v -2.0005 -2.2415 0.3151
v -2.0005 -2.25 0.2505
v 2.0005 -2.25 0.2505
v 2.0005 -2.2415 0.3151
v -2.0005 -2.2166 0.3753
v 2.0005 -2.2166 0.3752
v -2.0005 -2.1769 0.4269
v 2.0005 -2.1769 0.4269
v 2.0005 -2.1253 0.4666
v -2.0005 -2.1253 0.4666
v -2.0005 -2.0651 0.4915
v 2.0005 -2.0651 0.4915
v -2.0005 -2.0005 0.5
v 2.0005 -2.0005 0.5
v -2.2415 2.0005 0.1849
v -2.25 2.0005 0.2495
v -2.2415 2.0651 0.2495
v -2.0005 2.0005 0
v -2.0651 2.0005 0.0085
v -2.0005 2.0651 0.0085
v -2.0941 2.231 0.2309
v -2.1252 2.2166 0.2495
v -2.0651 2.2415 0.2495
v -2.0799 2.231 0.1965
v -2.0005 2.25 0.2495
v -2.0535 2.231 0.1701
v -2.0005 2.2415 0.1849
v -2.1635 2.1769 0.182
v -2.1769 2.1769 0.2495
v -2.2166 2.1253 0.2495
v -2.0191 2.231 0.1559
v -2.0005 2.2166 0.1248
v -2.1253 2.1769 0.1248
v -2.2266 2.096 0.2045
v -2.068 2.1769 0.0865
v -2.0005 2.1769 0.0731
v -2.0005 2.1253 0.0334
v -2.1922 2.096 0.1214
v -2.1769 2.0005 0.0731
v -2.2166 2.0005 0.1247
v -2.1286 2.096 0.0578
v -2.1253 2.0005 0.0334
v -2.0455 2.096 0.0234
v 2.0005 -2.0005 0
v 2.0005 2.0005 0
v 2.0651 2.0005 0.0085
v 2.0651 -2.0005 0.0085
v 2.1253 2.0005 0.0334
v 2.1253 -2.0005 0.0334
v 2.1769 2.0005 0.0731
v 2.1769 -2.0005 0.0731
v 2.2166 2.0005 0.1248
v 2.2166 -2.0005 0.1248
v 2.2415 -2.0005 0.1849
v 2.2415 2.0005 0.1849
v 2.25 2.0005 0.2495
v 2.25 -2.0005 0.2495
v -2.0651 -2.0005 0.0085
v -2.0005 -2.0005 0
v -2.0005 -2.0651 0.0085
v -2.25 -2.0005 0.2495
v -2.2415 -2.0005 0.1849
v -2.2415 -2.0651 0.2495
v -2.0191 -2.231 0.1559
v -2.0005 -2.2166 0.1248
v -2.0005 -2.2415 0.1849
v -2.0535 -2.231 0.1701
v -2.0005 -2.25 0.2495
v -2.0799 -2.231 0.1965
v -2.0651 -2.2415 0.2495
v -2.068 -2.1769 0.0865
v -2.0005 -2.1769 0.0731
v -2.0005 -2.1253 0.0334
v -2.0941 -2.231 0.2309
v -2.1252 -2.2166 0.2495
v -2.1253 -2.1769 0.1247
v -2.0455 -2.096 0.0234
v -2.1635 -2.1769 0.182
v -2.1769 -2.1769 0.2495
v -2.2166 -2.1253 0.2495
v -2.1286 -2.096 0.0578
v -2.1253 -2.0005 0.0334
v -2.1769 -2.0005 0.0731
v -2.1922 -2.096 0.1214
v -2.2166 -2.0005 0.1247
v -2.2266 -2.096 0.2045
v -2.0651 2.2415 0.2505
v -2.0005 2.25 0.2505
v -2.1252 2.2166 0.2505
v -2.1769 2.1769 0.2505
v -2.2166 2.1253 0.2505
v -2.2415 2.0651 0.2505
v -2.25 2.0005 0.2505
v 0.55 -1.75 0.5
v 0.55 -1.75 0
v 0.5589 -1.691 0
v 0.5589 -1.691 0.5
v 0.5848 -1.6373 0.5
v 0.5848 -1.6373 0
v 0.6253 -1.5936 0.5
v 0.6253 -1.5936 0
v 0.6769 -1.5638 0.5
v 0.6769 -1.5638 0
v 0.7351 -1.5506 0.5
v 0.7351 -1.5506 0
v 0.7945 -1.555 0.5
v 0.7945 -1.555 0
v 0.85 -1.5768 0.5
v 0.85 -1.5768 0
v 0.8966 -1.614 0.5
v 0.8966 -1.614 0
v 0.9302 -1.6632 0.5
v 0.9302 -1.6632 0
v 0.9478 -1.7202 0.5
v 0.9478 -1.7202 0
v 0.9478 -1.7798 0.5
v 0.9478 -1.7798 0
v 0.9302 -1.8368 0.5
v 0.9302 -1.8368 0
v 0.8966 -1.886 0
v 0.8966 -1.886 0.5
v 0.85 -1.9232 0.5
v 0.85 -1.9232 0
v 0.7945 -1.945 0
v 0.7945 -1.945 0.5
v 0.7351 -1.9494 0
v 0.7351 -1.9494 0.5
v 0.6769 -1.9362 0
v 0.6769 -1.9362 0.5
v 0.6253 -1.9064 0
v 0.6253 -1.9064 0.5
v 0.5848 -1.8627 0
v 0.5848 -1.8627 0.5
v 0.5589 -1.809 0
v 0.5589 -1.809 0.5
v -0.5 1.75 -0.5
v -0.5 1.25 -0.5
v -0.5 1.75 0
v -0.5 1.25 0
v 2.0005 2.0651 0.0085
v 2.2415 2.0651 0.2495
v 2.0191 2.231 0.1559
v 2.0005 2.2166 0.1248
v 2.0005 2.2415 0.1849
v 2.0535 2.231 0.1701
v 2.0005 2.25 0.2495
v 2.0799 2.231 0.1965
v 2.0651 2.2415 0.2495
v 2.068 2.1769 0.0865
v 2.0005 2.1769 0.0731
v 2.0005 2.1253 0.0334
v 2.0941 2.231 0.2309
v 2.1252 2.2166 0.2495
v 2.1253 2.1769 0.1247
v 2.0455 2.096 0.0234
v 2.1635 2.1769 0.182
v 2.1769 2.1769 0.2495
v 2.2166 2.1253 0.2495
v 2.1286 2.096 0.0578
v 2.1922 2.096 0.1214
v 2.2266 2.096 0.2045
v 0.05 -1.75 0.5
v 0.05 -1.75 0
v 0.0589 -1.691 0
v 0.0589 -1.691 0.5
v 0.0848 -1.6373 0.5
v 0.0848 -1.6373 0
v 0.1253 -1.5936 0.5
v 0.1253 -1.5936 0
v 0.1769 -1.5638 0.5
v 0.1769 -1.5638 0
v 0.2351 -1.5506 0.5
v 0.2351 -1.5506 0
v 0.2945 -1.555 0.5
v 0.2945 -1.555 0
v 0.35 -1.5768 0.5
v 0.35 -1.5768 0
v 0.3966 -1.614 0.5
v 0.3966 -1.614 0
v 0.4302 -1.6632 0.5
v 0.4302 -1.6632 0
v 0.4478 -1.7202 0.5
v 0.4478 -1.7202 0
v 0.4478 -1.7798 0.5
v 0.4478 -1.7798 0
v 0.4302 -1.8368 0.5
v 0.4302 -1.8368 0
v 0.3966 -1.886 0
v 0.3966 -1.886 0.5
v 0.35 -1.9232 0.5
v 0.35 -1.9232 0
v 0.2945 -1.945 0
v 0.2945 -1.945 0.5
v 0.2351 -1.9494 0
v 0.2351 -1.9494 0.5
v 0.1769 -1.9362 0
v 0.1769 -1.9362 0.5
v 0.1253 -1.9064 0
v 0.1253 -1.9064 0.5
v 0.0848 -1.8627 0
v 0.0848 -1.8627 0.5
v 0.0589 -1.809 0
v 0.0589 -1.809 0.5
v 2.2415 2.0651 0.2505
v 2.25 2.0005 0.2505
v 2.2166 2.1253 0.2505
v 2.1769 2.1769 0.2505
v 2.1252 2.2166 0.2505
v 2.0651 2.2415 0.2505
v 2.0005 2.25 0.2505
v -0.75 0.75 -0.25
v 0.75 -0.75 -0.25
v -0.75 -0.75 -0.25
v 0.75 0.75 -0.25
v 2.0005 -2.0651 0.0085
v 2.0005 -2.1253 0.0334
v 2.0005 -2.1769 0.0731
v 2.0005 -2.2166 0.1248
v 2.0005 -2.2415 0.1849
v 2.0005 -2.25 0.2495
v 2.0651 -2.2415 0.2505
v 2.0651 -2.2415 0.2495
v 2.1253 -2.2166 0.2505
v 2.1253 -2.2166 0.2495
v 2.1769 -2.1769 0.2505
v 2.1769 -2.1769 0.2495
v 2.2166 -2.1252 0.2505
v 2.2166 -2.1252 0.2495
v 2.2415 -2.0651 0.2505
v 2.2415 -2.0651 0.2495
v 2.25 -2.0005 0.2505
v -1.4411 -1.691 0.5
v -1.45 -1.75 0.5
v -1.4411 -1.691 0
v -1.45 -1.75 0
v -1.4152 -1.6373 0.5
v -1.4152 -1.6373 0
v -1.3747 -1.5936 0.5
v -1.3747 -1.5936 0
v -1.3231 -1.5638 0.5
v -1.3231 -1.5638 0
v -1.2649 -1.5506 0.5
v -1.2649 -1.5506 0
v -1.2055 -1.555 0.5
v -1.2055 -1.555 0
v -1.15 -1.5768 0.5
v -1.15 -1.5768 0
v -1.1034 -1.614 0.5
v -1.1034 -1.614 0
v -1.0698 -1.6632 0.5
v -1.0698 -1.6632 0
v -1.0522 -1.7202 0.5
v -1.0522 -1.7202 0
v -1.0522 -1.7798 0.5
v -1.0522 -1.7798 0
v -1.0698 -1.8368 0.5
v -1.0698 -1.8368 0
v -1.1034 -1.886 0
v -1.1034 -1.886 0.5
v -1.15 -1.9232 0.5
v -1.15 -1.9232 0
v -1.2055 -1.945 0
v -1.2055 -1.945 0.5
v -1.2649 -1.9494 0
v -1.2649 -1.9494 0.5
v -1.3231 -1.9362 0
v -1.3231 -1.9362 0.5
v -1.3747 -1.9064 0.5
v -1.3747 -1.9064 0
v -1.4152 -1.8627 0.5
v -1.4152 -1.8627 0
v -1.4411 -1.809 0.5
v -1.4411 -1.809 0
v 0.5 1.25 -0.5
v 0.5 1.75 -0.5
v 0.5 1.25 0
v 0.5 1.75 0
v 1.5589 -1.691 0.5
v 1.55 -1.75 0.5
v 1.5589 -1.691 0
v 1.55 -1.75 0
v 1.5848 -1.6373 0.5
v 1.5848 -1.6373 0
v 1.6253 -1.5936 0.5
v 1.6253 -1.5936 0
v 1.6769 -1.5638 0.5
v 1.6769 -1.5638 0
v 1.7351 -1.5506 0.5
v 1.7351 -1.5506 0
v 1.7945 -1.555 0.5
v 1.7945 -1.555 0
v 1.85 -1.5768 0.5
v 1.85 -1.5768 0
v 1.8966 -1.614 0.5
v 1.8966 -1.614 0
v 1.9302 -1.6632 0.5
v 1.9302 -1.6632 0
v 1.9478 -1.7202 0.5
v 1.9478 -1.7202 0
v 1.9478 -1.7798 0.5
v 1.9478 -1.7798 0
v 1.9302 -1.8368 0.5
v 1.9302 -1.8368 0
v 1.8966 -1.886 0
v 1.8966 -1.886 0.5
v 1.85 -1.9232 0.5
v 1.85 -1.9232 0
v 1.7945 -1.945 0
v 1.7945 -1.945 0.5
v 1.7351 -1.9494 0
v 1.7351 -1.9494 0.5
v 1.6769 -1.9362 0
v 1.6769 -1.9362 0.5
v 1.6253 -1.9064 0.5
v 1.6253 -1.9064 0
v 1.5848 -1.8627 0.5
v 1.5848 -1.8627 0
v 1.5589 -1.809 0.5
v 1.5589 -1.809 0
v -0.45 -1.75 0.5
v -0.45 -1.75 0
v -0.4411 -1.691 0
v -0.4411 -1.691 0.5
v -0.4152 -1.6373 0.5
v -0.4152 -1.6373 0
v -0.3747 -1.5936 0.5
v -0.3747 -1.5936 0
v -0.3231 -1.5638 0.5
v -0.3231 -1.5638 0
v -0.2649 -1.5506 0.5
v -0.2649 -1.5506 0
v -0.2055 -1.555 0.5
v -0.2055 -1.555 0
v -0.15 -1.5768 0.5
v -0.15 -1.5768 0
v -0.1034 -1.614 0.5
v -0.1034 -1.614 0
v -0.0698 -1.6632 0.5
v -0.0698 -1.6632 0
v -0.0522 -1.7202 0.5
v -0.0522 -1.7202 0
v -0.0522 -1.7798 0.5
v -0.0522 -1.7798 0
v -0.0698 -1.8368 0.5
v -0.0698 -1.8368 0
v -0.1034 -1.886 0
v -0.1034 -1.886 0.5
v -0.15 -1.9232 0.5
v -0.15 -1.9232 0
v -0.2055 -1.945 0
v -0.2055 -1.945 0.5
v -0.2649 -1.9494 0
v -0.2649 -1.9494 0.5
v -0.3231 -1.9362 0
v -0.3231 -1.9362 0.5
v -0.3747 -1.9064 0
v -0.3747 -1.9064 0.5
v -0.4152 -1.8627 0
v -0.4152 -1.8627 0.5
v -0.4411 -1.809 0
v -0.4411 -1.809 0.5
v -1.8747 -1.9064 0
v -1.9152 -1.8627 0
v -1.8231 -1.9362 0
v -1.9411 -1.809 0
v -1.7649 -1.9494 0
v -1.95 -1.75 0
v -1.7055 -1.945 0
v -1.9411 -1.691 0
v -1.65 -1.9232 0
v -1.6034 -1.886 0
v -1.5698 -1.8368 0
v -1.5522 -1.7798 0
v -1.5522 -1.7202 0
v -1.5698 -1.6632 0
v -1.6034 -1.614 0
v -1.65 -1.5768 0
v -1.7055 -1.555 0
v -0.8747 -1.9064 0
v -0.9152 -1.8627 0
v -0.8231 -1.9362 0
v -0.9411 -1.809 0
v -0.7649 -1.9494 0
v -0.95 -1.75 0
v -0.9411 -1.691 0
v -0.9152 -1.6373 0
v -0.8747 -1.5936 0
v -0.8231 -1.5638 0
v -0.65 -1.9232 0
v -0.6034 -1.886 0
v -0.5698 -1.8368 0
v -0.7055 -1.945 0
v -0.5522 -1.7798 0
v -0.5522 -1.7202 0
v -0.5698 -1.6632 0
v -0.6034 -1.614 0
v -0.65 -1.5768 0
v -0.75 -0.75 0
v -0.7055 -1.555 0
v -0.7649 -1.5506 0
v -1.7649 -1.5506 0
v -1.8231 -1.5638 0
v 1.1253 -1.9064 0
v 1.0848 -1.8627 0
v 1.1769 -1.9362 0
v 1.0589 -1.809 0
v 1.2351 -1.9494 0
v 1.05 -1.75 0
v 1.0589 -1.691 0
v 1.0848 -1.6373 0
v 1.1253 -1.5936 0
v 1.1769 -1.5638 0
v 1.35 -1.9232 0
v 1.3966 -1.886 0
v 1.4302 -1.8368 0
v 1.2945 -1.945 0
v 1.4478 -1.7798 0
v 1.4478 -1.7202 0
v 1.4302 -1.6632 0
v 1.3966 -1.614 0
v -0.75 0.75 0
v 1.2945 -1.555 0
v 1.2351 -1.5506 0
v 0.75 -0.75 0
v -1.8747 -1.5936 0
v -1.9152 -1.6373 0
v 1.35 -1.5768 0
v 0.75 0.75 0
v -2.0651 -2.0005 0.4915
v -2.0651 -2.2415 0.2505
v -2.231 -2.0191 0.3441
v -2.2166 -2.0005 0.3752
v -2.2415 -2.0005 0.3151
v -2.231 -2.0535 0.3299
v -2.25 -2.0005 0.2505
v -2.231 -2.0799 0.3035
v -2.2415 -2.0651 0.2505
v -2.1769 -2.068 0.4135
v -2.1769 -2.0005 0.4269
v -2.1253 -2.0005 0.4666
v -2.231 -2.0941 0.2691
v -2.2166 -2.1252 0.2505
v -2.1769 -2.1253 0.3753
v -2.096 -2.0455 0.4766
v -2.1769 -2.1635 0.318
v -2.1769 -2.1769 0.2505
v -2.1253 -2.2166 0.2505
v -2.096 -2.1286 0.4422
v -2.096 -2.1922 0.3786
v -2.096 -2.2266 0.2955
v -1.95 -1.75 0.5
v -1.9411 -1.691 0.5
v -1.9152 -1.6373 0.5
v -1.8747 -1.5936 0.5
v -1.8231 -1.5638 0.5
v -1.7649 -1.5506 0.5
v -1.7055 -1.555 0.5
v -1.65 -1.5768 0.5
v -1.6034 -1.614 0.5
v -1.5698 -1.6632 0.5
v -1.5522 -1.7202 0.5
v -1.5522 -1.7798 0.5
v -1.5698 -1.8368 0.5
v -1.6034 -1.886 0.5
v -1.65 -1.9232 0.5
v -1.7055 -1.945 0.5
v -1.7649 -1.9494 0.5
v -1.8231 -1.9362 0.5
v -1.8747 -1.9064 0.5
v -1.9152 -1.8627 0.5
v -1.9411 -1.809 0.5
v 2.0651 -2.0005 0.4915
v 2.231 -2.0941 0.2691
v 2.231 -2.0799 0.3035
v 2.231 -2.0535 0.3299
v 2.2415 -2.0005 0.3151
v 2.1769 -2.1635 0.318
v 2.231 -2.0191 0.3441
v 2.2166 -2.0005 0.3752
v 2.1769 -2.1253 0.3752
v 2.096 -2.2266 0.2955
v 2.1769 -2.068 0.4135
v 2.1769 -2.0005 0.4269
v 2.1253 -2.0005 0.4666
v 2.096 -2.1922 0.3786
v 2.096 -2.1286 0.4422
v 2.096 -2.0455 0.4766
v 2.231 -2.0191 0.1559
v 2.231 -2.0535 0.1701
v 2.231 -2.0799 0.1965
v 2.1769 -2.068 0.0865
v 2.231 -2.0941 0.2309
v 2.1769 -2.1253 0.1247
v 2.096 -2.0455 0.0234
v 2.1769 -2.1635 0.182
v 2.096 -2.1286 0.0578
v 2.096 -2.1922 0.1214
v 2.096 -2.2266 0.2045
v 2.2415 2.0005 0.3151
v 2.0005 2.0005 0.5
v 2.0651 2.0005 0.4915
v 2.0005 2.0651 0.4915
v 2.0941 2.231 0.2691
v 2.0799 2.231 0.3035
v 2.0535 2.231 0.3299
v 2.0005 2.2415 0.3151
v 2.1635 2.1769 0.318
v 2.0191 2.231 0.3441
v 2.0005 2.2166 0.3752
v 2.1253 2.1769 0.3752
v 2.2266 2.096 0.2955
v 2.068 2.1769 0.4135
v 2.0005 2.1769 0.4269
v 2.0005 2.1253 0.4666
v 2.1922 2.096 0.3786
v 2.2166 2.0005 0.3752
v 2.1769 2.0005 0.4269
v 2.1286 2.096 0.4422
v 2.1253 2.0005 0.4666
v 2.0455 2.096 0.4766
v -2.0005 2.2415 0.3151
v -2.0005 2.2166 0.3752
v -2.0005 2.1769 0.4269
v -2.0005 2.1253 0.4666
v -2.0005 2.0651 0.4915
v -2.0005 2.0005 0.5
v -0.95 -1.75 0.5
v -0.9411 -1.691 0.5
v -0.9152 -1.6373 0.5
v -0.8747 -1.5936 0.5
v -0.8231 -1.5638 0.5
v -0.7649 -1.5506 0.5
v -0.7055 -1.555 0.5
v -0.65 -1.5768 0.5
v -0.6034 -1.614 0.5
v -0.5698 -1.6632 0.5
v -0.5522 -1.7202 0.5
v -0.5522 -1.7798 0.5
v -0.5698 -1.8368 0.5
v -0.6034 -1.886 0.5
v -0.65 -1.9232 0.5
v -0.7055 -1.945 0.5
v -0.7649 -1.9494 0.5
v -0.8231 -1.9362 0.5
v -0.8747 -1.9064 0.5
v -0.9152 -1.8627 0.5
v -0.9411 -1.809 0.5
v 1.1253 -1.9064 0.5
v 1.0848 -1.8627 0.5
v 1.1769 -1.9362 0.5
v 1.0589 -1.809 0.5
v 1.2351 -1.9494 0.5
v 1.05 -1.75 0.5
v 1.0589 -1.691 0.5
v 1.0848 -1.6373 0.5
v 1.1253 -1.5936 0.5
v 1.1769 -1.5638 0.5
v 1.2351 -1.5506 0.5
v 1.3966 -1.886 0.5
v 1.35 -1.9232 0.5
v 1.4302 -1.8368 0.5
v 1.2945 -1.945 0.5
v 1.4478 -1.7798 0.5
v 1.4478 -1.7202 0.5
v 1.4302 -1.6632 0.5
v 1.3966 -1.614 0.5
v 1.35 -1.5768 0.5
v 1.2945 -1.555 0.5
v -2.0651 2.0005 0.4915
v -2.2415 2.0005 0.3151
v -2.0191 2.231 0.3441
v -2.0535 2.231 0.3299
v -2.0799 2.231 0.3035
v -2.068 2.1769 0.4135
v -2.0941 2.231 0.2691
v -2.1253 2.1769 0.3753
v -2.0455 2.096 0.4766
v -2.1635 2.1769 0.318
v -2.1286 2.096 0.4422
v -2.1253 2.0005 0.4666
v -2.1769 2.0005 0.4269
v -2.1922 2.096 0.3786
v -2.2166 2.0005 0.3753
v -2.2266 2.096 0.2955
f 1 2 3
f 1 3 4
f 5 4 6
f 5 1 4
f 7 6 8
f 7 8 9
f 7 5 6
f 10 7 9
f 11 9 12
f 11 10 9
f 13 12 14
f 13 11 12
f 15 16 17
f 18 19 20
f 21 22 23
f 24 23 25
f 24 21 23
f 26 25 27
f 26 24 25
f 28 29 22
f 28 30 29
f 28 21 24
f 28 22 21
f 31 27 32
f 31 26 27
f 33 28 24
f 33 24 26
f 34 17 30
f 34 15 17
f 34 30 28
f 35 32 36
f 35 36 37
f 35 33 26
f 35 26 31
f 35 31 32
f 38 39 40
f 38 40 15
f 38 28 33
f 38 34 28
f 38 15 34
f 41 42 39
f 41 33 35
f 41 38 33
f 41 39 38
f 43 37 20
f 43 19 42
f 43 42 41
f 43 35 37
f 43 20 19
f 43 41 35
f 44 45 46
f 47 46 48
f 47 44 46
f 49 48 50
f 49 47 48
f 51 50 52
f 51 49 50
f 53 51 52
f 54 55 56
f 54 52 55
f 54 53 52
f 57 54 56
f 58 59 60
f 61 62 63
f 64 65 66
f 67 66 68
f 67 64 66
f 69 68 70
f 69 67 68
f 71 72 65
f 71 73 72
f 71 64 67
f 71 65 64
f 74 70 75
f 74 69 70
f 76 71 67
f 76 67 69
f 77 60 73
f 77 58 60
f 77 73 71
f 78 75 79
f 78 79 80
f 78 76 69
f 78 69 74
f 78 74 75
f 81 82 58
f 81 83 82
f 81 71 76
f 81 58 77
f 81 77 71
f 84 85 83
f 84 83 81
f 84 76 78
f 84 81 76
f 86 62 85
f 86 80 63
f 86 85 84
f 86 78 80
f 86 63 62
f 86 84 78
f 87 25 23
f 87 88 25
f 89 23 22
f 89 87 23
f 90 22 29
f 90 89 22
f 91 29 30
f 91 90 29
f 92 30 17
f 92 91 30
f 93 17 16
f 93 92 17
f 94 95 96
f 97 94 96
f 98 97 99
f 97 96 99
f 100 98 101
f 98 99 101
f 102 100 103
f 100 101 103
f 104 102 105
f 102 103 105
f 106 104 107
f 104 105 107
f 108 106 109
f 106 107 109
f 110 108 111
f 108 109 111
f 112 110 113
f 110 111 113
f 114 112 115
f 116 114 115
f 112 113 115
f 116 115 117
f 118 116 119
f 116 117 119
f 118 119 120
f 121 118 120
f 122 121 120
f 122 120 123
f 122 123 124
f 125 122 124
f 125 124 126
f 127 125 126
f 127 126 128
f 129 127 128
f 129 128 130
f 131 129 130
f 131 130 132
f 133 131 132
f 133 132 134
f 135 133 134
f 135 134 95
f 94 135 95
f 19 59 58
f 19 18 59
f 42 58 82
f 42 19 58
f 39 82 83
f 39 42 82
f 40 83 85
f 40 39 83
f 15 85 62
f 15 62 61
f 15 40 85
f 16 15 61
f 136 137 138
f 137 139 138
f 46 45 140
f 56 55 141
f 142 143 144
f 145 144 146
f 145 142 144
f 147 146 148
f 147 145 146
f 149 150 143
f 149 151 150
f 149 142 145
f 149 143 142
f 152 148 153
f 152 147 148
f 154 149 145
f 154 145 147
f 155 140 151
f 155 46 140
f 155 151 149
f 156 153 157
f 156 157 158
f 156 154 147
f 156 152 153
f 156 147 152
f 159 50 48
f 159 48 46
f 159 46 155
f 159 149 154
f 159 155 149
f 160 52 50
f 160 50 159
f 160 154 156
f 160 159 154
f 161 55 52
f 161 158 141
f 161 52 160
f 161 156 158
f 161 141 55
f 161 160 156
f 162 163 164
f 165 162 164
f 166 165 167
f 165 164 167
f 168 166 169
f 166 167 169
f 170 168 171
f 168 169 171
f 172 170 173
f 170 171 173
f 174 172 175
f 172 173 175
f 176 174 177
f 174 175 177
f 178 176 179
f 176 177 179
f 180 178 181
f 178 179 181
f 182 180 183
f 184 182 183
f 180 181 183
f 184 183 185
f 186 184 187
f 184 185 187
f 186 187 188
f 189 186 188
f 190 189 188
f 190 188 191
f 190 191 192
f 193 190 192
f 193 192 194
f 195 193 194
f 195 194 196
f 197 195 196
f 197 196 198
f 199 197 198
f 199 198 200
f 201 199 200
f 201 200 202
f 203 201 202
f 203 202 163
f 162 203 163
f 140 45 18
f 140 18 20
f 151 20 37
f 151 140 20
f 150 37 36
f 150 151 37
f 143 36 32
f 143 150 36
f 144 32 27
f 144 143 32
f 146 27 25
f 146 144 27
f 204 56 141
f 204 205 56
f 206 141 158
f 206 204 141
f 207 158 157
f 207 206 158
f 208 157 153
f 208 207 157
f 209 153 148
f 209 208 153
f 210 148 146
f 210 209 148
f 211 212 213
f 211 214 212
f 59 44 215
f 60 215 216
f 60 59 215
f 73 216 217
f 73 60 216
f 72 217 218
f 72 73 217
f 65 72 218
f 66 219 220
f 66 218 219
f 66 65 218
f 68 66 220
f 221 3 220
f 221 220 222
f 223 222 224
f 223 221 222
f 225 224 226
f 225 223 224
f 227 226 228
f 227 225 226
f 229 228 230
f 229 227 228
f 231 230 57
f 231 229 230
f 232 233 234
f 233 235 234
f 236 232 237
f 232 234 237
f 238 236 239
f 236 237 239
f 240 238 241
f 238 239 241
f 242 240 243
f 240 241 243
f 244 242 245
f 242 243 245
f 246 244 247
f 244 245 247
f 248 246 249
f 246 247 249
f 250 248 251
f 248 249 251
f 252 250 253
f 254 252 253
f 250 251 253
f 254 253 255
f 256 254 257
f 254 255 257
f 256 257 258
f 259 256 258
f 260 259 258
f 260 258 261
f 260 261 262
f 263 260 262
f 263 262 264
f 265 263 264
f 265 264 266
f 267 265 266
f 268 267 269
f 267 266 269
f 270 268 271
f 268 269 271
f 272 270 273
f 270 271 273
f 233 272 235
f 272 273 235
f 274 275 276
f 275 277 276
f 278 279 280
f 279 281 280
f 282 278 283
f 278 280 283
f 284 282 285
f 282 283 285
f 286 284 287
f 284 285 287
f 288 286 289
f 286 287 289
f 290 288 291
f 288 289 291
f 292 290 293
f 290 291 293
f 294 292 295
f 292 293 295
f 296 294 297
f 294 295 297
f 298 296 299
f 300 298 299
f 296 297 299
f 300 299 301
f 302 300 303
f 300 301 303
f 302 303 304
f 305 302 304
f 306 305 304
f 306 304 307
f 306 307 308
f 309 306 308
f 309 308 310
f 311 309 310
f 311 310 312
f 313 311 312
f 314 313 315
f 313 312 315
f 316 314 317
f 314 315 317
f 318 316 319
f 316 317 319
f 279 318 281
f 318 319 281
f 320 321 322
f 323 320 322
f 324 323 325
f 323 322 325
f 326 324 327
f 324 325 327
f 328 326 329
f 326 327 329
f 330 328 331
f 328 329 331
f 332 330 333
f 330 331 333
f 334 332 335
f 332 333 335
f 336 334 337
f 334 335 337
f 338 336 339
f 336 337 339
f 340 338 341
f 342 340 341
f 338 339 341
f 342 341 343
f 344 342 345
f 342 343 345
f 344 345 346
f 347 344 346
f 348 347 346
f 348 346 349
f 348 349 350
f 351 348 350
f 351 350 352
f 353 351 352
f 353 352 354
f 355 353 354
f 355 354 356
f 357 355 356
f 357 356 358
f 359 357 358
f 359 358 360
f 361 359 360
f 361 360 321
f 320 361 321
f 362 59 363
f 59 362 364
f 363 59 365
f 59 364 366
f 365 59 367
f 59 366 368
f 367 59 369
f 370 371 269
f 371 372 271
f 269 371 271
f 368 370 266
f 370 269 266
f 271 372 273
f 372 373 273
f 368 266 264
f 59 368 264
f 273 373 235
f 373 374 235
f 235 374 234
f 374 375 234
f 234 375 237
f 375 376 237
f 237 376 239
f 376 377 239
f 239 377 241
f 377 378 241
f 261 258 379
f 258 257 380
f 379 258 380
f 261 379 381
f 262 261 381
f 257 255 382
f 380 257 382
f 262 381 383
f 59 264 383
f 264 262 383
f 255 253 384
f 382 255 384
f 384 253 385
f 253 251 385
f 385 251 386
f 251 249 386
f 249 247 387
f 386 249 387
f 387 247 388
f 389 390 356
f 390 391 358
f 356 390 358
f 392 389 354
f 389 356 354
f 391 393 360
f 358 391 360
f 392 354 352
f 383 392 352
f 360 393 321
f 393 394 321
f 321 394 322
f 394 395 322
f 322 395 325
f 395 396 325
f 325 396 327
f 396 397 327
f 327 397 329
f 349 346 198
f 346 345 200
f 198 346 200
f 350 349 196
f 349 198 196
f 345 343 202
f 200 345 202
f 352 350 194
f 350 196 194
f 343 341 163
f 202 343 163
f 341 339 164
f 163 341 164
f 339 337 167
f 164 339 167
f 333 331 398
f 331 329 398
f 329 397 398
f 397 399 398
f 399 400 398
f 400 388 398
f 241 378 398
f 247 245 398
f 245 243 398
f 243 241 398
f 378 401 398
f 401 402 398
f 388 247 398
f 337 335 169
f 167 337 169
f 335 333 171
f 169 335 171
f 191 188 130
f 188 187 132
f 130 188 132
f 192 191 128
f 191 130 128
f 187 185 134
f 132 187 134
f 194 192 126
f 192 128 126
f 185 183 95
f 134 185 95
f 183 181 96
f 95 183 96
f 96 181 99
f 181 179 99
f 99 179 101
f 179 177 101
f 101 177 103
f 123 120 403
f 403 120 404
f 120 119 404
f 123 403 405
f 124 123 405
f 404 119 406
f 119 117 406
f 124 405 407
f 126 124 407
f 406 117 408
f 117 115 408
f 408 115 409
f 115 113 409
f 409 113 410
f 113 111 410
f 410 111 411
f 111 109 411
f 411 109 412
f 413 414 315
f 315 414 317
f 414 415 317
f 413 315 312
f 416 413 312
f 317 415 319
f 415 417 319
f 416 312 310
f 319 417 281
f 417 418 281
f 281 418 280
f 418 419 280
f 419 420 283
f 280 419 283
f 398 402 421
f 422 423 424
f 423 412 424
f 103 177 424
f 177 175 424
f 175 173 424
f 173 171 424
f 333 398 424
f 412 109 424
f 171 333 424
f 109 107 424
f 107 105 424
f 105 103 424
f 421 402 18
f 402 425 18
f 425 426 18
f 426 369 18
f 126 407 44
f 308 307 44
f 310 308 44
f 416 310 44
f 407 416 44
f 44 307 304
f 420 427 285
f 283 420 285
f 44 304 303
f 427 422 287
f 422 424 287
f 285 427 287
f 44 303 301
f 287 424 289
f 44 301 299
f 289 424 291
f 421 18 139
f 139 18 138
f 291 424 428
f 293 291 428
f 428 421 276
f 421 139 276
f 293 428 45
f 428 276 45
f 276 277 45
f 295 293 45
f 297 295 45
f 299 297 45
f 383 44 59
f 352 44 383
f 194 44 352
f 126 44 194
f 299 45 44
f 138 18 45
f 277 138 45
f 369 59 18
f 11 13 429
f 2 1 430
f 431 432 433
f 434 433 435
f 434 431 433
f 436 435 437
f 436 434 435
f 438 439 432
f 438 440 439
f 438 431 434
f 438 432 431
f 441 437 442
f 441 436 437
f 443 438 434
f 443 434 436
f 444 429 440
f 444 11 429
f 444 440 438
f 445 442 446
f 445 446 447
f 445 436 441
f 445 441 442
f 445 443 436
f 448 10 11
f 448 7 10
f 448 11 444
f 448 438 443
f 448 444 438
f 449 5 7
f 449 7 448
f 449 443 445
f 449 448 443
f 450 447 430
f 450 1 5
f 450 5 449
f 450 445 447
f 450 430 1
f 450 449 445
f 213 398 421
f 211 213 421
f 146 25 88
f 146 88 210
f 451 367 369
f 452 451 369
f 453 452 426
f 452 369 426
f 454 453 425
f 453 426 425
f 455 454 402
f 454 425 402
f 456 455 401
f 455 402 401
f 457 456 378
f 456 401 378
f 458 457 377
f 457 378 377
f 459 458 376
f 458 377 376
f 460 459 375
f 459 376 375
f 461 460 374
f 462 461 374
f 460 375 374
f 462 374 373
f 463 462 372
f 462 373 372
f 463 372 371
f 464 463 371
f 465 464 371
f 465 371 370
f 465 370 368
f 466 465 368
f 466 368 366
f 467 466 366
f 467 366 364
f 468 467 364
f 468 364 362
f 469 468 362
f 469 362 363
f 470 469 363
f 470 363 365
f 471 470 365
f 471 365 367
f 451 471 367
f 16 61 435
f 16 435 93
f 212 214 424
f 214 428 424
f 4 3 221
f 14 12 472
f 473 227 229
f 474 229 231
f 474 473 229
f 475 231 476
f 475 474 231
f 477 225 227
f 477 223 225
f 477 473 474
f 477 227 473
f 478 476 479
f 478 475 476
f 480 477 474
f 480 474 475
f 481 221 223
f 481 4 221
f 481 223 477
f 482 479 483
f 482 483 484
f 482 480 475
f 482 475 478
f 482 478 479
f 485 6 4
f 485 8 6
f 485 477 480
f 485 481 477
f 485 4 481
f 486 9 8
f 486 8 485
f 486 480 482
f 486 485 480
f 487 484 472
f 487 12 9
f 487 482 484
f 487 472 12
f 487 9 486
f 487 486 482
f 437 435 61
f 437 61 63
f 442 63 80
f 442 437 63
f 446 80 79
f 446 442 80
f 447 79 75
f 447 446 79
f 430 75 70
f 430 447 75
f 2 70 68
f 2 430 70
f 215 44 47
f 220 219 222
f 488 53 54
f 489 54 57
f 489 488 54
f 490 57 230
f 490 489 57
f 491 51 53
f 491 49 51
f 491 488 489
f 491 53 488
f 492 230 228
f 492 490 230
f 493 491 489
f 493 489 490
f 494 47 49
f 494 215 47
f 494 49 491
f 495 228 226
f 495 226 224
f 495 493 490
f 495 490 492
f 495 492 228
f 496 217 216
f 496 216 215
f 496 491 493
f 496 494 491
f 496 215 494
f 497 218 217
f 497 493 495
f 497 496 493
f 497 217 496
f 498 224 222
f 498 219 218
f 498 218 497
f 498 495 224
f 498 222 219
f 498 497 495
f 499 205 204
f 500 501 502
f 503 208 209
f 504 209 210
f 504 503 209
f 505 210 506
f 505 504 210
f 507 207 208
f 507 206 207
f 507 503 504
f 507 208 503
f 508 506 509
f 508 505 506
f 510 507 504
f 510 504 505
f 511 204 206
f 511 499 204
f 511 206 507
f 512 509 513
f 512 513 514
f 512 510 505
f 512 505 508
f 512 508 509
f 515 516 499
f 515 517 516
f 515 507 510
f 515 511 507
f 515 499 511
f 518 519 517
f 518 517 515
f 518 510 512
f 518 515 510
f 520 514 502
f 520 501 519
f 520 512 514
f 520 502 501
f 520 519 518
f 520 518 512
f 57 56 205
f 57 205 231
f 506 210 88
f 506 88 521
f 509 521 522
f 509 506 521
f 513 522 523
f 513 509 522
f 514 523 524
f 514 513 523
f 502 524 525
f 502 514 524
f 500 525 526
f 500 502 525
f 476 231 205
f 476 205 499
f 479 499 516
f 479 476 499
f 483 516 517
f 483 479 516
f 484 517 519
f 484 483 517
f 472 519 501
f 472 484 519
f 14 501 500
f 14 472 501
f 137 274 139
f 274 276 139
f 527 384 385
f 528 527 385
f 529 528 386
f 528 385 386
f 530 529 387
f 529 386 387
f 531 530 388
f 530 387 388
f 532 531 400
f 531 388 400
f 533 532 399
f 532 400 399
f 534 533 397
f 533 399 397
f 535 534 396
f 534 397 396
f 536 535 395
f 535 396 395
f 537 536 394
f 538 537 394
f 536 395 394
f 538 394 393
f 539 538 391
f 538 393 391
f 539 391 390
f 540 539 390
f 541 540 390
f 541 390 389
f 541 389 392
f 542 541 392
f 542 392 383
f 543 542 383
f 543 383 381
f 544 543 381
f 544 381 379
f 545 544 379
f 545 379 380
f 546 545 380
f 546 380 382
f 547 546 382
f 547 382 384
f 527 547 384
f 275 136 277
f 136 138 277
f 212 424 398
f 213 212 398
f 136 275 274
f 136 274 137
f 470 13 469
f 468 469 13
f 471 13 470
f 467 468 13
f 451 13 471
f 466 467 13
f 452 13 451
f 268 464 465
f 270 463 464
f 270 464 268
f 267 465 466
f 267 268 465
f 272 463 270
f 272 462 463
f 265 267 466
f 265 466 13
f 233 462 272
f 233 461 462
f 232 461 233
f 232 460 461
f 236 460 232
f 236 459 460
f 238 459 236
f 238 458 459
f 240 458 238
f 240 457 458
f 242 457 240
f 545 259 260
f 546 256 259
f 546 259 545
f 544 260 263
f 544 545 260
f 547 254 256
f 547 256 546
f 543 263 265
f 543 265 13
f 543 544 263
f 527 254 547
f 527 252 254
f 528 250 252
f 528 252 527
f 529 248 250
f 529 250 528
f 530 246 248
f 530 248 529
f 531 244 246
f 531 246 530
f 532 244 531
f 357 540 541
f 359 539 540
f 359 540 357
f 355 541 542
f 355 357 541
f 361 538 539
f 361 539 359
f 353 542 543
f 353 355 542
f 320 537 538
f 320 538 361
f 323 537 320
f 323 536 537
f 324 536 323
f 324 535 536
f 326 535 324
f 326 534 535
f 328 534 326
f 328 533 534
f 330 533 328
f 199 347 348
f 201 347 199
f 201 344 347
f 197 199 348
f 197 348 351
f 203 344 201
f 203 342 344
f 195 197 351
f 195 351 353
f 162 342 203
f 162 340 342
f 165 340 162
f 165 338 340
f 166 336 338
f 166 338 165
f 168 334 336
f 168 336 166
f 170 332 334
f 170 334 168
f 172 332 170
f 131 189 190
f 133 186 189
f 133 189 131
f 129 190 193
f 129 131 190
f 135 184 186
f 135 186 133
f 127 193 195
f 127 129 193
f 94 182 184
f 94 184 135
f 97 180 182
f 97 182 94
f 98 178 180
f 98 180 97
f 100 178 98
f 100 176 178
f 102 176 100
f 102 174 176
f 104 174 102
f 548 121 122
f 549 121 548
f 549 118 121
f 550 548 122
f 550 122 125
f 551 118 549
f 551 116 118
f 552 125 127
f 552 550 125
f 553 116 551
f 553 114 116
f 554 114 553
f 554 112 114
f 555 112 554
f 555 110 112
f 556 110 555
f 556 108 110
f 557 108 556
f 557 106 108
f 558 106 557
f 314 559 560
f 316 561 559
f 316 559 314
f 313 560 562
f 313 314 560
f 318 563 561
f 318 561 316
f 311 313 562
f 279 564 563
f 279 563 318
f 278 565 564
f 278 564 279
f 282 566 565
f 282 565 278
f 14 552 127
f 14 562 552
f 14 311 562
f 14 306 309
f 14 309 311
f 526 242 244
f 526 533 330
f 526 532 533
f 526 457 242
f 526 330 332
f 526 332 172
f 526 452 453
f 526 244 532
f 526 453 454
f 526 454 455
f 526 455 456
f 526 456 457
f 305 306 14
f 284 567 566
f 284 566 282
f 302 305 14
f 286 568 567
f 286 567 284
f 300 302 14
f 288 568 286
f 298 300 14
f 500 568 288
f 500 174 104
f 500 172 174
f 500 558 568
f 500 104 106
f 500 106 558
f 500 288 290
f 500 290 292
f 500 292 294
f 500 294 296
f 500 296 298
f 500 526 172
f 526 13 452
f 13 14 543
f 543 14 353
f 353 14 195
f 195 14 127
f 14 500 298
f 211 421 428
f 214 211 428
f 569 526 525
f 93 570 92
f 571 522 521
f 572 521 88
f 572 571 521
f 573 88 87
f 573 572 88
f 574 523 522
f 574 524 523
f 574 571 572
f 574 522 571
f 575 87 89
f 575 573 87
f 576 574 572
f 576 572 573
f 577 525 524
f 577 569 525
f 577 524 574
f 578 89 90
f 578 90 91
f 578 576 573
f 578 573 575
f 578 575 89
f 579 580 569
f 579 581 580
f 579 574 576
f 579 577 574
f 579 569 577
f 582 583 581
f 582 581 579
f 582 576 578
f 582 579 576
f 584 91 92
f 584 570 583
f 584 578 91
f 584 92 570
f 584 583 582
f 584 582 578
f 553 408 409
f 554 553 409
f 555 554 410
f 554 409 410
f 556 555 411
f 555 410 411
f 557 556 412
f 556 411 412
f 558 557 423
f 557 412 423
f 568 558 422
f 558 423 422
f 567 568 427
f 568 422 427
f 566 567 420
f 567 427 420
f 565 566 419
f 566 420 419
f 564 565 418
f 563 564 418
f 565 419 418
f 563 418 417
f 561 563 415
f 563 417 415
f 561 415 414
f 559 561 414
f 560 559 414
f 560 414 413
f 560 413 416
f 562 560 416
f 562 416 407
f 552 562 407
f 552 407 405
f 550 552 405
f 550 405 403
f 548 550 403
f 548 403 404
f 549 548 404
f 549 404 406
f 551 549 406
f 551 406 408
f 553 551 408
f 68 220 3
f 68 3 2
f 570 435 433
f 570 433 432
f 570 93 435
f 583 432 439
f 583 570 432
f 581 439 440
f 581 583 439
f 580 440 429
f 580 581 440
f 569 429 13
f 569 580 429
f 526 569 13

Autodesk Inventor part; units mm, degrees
ref_plane "YZ Plane" through (0, 0, 0) normal (1, 0, 0) x (0, 1, 0)
ref_plane "XZ Plane" through (0, 0, 0) normal (0, 1, 0) x (-1, 0, 0)
ref_plane "XY Plane" through (0, 0, 0) normal (0, 0, 1) x (1, 0, 0)
sketch "Szkic1" plane through (0, 0, 0) normal (0, 0, 1) x (1, 0, 0)
  line L0 (0, 2.25) -> (2.25, 2.25)
  line L1 (2.25, 2.25) -> (2.25, -2.25)
  line L2 (2.25, -2.25) -> (-2.25, -2.25)
  line L3 (-2.25, -2.25) -> (-2.25, 2.25)
  line L4 (-2.25, 2.25) -> (0, 2.25)
  point P0 (0, 0)
  dimension "d2" = 2.25
  dimension "d3" = 4.5
  dimension "d5" = 4.5
extrude "Wyciągnięcie proste1" add sketch "Szkic1" along normal blind 0.5
fillet "Zaokrąglenie1" radius 0.25 12 edges at (0, -2.25, 0.5) (-2.25, 0, 0.5) (-2.25, 0, 0) (0, -2.25, 0) (-2.25, -2.25, 0.25) (2.25, -2.25, 0.25) (2.25, 0, 0.5) (2.25, 0, 0) (2.25, 2.25, 0.25) (1.125, 2.25, 0.5) (1.125, 2.25, 0) (-2.25, 2.25, 0.25)
sketch "Szkic2" plane through (0, 0, 0) normal (0, 0, -1) x (-1, 0, 0)
  line L0 (-0.75, -0.75) -> (0.75, -0.75)
  line L1 (0.75, -0.75) -> (0.75, 0.75)
  line L2 (0.75, 0.75) -> (-0.75, 0.75)
  line L3 (-0.75, 0.75) -> (-0.75, -0.75)
  line L4 (-0.75, -0.75) -> (0.75, 0.75) construction
  line L5 (0.75, -0.75) -> (-0.75, 0.75) construction
  line L6 (0.5, 1.25) -> (-0.5, 1.25)
  line L7 (-0.5, 1.25) -> (-0.5, 1.75)
  line L8 (-0.5, 1.75) -> (0.5, 1.75)
  line L9 (0.5, 1.75) -> (0.5, 1.25)
  line L10 (0.5, 1.25) -> (-0.5, 1.75) construction
  line L11 (-0.5, 1.25) -> (0.5, 1.75) construction
  point P0 (0, 0)
  point P1 (0, 1.5)
  dimension "d9" = 1.5
  dimension "d10" = 1.5
  dimension "d13" = 1
  dimension "d14" = 0.5
extrude "Wyciągnięcie proste2" add sketch "Szkic2" along normal blind 0.25 contours L3 L2 L1 L0
sketch "Szkic3" plane through (0, 0, 0) normal (0, 0, -1) x (-1, 0, 0)
  line L0 (0.5, 1.75) -> (-0.5, 1.75)
  line L1 (-0.5, 1.75) -> (-0.5, 1.25)
  line L2 (-0.5, 1.25) -> (0.5, 1.25)
  line L3 (0.5, 1.25) -> (0.5, 1.75)
  line L4 (0.5, 1.75) -> (-0.5, 1.25) construction
  line L5 (-0.5, 1.75) -> (0.5, 1.25) construction
  point P0 (0, 0)
  point P1 (0, 1.5)
  dimension "d15" = 1
  dimension "d16" = 0.5
extrude "Wyciągnięcie proste3" add sketch "Szkic3" along normal blind 0.5
sketch "Szkic4" plane through (0, 0, 0) normal (0, 0, -1) x (-1, 0, 0)
  line L0 (2, -2) -> (-2, -2) projected
  line L1 (2, -2) -> (2, -1.75)
  line L2 (2, 2) -> (2, -2) projected
  line L3 (2, -1.75) -> (1.75, -1.75)
  circle A0 centre (1.75, -1.75) radius 0.2
  line L4 (1.75, -1.75) -> (1.25, -1.75)
  line L5 (1.25, -1.75) -> (0.75, -1.75)
  line L6 (0.75, -1.75) -> (0.25, -1.75)
  line L7 (0.25, -1.75) -> (-0.25, -1.75)
  line L8 (-0.25, -1.75) -> (-0.75, -1.75)
  line L9 (-0.75, -1.75) -> (-1.25, -1.75)
  line L10 (-1.25, -1.75) -> (-1.75, -1.75)
  circle A1 centre (1.25, -1.75) radius 0.2
  circle A2 centre (0.75, -1.75) radius 0.2
  circle A3 centre (0.25, -1.75) radius 0.2
  circle A4 centre (-0.25, -1.75) radius 0.2
  circle A5 centre (-0.75, -1.75) radius 0.2
  circle A6 centre (-1.25, -1.75) radius 0.2
  circle A7 centre (-1.75, -1.75) radius 0.2
  point P0 (0, 0)
  dimension "d19" = 0.25
  dimension "d20" = 0.25
  dimension "d21" = 0.4
  dimension "d22" = 0.5
  dimension "d23" = 0.5
  dimension "d24" = 0.5
  dimension "d25" = 0.5
  dimension "d26" = 0.5
  dimension "d27" = 0.5
  dimension "d28" = 0.5
  dimension "d29" = 0.4
  dimension "d30" = 0.4
  dimension "d31" = 0.4
  dimension "d32" = 0.4
  dimension "d33" = 0.4
  dimension "d34" = 0.4
  dimension "d35" = 0.4
extrude "Wyciągnięcie proste4" cut sketch "Szkic4" against normal blind 0.5
properties part number "Czujnik GPS ZOE-M8Q"
